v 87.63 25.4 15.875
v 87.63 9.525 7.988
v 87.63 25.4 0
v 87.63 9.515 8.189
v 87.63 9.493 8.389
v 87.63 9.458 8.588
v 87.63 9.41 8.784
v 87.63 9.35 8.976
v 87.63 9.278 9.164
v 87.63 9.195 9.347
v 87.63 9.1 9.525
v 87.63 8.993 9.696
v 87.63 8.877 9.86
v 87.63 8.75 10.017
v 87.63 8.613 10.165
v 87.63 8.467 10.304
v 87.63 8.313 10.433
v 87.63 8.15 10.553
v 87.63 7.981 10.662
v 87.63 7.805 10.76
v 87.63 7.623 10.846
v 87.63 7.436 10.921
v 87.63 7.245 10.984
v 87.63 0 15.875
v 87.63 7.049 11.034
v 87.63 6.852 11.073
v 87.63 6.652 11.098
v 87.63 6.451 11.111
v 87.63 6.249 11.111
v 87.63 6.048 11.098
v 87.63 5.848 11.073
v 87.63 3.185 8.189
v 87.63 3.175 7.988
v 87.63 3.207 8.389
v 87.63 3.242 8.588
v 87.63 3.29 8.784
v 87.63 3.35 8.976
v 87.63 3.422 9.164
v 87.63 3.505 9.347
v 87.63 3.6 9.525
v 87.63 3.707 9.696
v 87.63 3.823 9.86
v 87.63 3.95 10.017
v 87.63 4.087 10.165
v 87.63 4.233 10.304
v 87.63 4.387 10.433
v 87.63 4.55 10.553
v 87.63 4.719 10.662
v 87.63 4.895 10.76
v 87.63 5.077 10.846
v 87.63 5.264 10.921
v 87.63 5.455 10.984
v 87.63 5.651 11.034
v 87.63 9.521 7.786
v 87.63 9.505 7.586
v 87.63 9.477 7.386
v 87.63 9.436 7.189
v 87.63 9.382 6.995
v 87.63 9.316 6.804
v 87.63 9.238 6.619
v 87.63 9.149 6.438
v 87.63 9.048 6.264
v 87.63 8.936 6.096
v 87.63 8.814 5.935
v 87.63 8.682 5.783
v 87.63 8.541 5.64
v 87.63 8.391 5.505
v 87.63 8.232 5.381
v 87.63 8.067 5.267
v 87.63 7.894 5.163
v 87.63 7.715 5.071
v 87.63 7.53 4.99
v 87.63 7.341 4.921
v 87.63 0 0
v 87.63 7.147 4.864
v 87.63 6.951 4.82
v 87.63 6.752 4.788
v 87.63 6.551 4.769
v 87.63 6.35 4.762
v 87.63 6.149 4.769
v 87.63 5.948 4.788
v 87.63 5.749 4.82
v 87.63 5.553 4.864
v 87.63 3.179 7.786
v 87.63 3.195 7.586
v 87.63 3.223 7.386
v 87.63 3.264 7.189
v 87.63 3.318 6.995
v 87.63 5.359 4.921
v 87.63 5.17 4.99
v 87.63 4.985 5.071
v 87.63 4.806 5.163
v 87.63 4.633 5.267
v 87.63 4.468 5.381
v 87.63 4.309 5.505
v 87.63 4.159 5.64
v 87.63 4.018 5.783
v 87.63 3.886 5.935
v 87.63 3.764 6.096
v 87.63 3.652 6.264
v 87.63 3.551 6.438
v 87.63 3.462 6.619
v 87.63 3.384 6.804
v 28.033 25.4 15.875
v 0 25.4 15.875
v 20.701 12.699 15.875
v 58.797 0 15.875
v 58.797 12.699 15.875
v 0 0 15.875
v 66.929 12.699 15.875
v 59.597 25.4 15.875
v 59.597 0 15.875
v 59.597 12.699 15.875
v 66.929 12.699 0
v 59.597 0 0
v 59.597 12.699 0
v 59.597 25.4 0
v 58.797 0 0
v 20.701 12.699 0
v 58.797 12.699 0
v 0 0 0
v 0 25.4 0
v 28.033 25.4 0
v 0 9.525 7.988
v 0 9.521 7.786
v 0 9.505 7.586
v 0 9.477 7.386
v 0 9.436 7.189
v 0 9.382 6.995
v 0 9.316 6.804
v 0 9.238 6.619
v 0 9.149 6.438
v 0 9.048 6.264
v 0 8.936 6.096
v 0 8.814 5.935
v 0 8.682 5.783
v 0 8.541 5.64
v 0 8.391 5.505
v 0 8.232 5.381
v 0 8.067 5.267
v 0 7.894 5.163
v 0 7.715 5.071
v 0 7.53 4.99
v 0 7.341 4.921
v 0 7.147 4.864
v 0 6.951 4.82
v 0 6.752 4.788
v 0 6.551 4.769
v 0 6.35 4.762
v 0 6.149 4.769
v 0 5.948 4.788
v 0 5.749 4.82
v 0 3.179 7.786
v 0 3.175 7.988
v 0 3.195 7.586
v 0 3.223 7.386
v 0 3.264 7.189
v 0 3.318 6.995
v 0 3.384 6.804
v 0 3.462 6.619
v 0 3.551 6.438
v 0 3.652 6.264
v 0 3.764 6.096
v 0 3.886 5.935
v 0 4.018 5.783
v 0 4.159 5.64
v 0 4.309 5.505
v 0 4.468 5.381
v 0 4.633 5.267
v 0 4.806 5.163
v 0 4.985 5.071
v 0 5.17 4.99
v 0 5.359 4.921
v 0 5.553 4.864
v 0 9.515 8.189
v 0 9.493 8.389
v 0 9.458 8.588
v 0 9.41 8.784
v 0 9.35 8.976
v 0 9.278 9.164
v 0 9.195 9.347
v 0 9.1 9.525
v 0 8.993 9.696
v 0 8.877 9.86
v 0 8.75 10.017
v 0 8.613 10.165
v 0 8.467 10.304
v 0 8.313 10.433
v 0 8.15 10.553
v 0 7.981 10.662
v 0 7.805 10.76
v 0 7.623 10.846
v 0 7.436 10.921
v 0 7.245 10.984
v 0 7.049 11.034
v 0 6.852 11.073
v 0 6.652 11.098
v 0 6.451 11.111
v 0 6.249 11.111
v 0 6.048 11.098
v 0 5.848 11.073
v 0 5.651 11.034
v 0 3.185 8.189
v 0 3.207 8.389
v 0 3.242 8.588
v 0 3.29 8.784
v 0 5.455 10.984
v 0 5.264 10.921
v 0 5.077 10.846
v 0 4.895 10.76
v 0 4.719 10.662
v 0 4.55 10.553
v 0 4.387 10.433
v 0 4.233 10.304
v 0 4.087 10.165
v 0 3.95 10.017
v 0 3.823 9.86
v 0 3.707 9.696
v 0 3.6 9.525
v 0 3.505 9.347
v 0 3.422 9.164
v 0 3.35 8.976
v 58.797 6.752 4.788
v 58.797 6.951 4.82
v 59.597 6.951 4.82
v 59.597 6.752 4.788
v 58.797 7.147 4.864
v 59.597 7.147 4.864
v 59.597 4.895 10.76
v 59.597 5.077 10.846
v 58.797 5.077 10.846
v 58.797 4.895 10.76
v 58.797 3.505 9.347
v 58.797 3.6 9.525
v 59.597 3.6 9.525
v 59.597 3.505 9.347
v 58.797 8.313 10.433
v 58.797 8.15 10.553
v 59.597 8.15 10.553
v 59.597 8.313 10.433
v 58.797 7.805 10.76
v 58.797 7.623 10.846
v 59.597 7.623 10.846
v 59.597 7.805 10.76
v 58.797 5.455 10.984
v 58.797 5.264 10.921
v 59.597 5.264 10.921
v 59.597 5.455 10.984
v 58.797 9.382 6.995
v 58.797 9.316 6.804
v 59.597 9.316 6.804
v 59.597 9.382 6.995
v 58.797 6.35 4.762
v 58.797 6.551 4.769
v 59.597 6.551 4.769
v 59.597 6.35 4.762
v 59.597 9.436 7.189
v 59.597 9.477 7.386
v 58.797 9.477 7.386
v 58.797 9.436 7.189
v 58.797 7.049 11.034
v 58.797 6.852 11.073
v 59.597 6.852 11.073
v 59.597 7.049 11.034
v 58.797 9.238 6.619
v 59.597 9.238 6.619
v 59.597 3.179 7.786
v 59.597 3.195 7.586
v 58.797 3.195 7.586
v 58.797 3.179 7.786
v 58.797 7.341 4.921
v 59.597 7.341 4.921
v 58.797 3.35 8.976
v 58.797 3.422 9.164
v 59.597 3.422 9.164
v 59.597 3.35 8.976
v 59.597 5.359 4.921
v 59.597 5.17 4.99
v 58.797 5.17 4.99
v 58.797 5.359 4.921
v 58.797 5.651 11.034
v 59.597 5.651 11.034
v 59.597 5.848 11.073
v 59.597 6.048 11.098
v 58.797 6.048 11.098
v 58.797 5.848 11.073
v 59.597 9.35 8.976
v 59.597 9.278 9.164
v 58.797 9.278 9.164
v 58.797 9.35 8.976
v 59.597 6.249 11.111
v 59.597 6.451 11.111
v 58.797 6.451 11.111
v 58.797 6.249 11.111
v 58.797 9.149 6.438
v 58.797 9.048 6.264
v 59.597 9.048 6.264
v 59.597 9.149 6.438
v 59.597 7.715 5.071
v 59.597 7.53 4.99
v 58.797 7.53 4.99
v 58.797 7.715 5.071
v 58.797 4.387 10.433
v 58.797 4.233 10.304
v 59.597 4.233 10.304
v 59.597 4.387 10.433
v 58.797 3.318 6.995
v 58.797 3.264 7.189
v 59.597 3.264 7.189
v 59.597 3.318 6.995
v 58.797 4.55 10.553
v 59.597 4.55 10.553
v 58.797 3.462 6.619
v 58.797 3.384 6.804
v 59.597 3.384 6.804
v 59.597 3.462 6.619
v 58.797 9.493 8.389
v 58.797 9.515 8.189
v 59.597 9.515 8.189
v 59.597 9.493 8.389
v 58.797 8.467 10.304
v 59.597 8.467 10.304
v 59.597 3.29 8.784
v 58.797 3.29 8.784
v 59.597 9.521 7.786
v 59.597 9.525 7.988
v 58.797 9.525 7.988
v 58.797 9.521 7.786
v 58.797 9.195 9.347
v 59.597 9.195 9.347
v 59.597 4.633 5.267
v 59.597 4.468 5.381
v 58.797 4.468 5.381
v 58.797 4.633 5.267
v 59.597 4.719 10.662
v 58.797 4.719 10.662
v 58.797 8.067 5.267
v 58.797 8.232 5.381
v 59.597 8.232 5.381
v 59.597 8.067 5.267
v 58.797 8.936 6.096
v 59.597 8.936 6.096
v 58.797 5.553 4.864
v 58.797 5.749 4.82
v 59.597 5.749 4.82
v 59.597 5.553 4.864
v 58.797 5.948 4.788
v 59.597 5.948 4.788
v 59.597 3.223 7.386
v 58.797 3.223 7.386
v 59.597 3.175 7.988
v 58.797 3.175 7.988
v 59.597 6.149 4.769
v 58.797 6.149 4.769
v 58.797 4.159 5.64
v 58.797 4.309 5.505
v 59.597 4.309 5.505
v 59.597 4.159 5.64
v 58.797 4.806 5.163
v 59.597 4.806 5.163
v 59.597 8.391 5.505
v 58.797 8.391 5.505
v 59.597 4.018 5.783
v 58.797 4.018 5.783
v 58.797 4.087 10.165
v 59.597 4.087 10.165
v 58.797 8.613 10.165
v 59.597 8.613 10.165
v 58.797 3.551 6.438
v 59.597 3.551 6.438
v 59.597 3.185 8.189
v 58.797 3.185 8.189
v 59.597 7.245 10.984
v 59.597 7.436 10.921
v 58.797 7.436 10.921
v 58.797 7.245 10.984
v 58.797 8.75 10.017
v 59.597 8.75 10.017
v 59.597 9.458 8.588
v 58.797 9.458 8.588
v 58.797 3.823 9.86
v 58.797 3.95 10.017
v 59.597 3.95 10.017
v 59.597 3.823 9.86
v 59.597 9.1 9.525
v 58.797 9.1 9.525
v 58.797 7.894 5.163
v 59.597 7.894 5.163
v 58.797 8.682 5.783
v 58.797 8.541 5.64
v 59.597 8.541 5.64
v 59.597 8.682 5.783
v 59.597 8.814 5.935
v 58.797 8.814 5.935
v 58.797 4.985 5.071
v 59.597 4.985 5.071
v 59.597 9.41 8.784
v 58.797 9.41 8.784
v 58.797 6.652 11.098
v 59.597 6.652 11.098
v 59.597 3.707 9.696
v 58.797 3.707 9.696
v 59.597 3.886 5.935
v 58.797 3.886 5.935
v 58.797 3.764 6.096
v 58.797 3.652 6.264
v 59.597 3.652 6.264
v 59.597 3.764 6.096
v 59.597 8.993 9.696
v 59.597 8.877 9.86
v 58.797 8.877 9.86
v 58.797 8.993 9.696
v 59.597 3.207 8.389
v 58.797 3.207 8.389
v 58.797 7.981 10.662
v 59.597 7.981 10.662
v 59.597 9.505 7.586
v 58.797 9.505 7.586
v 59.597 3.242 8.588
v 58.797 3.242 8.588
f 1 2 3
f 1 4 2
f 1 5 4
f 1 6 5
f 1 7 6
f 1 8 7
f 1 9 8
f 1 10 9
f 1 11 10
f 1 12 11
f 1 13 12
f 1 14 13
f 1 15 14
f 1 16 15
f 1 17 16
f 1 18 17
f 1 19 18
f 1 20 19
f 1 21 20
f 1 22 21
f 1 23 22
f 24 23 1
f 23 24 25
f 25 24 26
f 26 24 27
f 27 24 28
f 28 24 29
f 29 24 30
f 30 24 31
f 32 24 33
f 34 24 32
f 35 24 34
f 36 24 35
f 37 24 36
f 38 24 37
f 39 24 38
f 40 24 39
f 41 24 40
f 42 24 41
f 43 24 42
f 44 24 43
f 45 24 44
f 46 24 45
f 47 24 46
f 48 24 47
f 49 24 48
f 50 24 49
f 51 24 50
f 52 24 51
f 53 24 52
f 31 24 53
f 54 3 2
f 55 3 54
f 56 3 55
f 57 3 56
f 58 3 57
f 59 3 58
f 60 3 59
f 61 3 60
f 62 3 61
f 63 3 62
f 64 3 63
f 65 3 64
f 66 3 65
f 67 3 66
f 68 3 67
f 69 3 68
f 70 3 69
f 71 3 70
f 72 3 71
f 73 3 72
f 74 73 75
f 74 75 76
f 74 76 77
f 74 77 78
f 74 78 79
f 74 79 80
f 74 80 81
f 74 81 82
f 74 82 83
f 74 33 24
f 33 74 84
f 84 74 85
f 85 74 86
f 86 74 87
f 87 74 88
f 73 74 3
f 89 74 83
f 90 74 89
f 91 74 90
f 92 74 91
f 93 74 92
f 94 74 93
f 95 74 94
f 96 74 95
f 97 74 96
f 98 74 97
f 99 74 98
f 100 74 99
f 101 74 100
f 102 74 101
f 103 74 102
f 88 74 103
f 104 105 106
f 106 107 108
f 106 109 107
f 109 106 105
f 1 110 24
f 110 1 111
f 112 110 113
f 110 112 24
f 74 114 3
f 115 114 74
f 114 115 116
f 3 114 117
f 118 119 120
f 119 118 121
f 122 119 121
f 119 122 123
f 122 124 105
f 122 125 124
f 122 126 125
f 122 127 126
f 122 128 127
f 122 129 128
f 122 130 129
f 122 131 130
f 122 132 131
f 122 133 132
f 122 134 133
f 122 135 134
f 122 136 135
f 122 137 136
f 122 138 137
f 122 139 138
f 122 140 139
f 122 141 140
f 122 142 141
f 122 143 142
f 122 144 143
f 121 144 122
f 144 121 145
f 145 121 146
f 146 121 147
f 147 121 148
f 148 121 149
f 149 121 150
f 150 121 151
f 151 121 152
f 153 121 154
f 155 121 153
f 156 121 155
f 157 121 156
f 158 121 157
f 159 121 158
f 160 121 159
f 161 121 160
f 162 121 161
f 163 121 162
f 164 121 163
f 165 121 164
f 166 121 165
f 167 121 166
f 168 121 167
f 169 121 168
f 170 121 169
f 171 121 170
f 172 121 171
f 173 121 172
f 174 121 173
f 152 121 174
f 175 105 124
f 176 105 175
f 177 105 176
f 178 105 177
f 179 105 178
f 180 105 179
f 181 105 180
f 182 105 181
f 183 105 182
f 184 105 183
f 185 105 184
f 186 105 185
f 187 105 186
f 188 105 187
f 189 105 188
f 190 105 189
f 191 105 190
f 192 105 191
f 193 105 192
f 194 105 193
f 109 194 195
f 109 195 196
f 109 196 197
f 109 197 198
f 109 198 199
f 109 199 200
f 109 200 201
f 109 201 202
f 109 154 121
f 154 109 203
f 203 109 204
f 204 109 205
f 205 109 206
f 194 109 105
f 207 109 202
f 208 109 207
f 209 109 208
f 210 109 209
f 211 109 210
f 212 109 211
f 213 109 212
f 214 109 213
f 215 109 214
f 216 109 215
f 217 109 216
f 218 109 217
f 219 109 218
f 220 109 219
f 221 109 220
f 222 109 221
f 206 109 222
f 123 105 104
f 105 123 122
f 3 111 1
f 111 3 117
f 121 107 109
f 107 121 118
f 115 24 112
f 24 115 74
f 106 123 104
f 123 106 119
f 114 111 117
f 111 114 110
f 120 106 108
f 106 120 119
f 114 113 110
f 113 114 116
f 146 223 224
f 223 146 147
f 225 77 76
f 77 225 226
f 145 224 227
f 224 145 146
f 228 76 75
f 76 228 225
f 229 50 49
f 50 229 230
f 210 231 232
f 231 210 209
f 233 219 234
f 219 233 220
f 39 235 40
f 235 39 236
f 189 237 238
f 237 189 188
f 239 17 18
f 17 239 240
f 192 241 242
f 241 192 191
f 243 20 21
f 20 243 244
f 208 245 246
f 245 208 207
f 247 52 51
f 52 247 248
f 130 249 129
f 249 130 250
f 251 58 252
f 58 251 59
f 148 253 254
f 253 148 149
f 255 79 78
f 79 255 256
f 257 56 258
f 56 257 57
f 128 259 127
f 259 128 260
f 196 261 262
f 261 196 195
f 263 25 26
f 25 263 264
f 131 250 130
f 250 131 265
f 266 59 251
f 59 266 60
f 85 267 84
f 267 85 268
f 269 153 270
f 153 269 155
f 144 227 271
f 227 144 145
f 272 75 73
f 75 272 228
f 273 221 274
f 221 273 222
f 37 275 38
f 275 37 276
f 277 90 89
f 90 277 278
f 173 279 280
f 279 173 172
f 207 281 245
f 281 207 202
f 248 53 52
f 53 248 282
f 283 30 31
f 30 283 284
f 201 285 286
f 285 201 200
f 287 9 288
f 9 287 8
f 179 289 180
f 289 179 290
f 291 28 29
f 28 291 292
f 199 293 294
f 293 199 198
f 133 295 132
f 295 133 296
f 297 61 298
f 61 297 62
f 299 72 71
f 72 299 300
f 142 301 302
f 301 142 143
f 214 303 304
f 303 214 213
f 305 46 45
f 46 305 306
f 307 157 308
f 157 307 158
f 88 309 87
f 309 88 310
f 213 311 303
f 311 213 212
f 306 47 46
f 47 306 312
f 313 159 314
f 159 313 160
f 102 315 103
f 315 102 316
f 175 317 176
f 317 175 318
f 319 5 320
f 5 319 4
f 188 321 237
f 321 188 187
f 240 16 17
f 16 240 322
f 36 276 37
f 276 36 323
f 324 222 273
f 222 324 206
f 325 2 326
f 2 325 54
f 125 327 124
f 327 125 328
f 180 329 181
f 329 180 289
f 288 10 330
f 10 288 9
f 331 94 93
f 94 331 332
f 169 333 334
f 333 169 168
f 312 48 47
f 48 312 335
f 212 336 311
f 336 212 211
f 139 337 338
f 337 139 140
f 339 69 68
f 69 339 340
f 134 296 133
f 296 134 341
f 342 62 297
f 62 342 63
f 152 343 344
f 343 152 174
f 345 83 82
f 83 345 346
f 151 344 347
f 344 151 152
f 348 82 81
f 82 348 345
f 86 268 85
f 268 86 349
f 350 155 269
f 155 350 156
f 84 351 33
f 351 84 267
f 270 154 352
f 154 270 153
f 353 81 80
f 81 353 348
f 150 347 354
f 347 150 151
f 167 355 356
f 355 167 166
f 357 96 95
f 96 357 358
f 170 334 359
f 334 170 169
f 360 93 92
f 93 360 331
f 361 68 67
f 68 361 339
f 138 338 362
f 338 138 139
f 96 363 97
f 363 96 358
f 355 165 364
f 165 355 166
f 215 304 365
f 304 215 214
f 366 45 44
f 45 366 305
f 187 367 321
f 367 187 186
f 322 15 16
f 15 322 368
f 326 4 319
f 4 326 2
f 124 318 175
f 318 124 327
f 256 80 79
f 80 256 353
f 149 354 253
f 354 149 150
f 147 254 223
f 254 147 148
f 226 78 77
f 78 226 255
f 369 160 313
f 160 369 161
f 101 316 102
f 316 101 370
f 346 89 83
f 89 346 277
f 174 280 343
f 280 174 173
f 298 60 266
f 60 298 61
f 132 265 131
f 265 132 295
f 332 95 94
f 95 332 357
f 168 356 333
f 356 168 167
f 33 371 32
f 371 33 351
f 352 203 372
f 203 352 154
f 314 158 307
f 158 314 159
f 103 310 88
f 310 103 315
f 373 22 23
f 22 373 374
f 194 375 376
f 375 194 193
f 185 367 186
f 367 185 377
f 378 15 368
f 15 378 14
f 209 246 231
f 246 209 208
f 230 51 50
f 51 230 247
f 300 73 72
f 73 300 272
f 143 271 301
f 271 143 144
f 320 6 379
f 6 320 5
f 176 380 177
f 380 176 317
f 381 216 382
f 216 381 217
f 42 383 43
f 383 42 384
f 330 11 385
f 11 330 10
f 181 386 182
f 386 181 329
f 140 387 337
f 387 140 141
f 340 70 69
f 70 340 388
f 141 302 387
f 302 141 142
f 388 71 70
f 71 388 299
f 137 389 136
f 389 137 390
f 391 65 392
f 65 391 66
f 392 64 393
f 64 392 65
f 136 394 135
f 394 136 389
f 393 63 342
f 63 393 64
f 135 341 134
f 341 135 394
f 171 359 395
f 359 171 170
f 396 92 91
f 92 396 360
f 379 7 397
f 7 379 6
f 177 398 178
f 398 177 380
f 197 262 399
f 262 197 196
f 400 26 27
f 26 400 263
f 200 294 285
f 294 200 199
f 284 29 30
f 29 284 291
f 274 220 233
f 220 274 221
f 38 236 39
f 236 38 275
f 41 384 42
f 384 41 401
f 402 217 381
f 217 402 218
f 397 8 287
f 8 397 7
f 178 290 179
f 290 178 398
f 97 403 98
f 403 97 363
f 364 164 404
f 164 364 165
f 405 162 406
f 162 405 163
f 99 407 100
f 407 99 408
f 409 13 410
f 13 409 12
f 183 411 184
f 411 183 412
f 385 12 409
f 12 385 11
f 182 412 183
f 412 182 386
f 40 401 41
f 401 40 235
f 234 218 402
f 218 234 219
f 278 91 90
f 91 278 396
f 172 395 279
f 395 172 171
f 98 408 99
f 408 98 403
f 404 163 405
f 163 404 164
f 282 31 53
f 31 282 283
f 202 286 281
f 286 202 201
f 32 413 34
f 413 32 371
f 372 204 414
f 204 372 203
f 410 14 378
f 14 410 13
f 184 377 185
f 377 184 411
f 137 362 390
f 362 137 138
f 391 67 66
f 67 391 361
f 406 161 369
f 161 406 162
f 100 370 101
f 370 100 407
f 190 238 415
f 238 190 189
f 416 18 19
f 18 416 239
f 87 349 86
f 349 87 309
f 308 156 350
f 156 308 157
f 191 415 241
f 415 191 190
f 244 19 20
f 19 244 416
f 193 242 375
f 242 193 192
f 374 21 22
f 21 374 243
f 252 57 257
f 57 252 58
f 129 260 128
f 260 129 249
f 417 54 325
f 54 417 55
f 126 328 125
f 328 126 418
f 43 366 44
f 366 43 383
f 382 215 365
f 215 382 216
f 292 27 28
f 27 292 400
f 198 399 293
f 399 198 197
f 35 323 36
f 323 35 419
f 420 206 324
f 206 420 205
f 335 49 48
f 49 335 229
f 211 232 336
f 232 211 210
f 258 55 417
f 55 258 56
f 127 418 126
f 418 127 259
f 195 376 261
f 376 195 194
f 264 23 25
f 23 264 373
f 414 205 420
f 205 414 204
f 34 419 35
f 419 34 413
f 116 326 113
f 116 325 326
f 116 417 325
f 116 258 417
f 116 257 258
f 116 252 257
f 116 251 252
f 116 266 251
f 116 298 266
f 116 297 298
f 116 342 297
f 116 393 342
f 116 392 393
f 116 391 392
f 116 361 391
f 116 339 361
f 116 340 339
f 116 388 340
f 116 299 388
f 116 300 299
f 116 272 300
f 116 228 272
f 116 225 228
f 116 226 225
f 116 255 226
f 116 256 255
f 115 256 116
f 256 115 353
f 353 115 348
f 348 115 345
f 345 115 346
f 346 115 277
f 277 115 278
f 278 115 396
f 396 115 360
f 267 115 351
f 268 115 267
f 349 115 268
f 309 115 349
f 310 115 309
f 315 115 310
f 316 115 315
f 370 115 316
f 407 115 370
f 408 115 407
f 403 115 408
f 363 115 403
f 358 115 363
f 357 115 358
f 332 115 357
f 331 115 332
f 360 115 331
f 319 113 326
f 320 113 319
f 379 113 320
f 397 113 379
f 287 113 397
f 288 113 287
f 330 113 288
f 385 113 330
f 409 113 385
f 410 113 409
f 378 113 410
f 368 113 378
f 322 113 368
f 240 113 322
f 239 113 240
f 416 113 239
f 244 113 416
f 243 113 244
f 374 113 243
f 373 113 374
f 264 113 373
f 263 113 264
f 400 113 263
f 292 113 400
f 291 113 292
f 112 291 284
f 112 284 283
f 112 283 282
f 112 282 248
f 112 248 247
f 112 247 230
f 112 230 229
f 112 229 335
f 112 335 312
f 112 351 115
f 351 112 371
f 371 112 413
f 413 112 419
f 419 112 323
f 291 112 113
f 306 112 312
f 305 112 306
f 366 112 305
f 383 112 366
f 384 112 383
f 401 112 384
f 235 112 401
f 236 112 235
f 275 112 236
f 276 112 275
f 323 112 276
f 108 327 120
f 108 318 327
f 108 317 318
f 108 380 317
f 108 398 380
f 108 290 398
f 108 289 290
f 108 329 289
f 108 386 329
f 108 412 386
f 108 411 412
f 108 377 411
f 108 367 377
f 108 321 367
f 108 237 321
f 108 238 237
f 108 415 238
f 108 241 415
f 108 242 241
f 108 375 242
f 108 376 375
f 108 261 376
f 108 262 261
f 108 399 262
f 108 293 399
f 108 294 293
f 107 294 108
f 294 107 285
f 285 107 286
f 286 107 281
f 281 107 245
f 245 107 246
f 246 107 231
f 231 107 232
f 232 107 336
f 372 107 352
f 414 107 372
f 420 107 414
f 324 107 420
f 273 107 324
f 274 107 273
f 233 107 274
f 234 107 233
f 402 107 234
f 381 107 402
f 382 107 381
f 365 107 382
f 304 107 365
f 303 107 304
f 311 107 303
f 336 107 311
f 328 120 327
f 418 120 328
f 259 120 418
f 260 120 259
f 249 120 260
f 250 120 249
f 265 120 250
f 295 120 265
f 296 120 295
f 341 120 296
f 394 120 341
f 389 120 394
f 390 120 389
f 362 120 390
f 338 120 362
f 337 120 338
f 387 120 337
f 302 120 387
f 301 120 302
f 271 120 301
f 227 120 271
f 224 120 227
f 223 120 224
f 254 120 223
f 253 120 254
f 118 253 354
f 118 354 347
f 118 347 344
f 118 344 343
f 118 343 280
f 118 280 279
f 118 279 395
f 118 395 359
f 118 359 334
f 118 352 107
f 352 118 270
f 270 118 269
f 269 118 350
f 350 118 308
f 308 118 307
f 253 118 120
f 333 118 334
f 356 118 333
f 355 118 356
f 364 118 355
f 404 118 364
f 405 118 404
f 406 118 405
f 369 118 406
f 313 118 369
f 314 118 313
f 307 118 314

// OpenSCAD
/* dimensions of metal stock */
// length of stock in mm
$stock_x = 87.63; //50.8; // [10.0:200.0]
// height of stock in mm
$stock_y = 25.4; //26.9875; // [10.0:150.0]
// width of stock in mm
$stock_z = 15.875; // 5/8; //14.2875; // [4.0:50.0]
/* dovetail dimensions */
// dovetail angle (usually 60)
$dove_angle = 60; //[30:70]
// widest part of the dovetail, in mm
$dove_max_width = 46.228; //29.1592; // [5.0:150.0]
// depth of dovetail, in mm
$dove_depth = 12.7; //9.525; // [5.0:100.0]
// width of the movable/clamp end in mm (minus dovetail overhang)
$clamp_width = 20.701; //9.741; // [5:100.0]
// gap made by virtual slitting saw
$slice_width = 0.80; // [0.04:4.0]
// diameter of hole for threaded clamping rod
$clamp_rod_dia = 6.35; // [1.0:15.0]
/* 
   NOTE: 6.35 for 1/4, 4.978 for #10, 4.305 for #8, 3.657 for #6
*/

dove_overhang = ($dove_depth / tan($dove_angle));
dove_x_offset = $clamp_width + ($dove_max_width / 2);
// slice_location = dove_x_offset + ($dove_max_width / 2)-$slice_width;
slice_location = dove_x_offset + ($dove_max_width / 2) - 
                 dove_overhang - $slice_width;

difference() {
    // the hunk of metal:
    cube([$stock_x, $stock_y, $stock_z]);
    translate([0, $stock_y - $dove_depth, 0]) {
        min_width = $dove_max_width - (2*dove_overhang);       
        // make a 3D dovetail from a 2D outline
        linear_extrude(height=$stock_z, convexity=2) {
            translate([dove_x_offset, $dove_depth, 0]) {
                rotate([0,0,180]) {
                    // the actual dovetail shape:
                    polygon(paths=[[0,1,2,3,0]], 
                            points=[[-min_width/2,0], 
                                    [-$dove_max_width/2, $dove_depth + 0.001], 
                                    [$dove_max_width/2, $dove_depth + 0.001], 
                                    [min_width/2,0]]);
                };
            };
        };
    };
    
    // the bore for the clamping threaded rod:
    translate([0, (($stock_y - $dove_depth) / 2), ($stock_z / 2)]) {
        rotate([0, 90, 0]) {
            cylinder(h=$stock_x, r=($clamp_rod_dia / 2), $fn=99);
        };
    };
    
    // slit with a slitting saw:
    translate([ slice_location, 0, 0 ]) {
            cube([$slice_width, ($stock_y - $dove_depth), $stock_z+5]);
    };
};
